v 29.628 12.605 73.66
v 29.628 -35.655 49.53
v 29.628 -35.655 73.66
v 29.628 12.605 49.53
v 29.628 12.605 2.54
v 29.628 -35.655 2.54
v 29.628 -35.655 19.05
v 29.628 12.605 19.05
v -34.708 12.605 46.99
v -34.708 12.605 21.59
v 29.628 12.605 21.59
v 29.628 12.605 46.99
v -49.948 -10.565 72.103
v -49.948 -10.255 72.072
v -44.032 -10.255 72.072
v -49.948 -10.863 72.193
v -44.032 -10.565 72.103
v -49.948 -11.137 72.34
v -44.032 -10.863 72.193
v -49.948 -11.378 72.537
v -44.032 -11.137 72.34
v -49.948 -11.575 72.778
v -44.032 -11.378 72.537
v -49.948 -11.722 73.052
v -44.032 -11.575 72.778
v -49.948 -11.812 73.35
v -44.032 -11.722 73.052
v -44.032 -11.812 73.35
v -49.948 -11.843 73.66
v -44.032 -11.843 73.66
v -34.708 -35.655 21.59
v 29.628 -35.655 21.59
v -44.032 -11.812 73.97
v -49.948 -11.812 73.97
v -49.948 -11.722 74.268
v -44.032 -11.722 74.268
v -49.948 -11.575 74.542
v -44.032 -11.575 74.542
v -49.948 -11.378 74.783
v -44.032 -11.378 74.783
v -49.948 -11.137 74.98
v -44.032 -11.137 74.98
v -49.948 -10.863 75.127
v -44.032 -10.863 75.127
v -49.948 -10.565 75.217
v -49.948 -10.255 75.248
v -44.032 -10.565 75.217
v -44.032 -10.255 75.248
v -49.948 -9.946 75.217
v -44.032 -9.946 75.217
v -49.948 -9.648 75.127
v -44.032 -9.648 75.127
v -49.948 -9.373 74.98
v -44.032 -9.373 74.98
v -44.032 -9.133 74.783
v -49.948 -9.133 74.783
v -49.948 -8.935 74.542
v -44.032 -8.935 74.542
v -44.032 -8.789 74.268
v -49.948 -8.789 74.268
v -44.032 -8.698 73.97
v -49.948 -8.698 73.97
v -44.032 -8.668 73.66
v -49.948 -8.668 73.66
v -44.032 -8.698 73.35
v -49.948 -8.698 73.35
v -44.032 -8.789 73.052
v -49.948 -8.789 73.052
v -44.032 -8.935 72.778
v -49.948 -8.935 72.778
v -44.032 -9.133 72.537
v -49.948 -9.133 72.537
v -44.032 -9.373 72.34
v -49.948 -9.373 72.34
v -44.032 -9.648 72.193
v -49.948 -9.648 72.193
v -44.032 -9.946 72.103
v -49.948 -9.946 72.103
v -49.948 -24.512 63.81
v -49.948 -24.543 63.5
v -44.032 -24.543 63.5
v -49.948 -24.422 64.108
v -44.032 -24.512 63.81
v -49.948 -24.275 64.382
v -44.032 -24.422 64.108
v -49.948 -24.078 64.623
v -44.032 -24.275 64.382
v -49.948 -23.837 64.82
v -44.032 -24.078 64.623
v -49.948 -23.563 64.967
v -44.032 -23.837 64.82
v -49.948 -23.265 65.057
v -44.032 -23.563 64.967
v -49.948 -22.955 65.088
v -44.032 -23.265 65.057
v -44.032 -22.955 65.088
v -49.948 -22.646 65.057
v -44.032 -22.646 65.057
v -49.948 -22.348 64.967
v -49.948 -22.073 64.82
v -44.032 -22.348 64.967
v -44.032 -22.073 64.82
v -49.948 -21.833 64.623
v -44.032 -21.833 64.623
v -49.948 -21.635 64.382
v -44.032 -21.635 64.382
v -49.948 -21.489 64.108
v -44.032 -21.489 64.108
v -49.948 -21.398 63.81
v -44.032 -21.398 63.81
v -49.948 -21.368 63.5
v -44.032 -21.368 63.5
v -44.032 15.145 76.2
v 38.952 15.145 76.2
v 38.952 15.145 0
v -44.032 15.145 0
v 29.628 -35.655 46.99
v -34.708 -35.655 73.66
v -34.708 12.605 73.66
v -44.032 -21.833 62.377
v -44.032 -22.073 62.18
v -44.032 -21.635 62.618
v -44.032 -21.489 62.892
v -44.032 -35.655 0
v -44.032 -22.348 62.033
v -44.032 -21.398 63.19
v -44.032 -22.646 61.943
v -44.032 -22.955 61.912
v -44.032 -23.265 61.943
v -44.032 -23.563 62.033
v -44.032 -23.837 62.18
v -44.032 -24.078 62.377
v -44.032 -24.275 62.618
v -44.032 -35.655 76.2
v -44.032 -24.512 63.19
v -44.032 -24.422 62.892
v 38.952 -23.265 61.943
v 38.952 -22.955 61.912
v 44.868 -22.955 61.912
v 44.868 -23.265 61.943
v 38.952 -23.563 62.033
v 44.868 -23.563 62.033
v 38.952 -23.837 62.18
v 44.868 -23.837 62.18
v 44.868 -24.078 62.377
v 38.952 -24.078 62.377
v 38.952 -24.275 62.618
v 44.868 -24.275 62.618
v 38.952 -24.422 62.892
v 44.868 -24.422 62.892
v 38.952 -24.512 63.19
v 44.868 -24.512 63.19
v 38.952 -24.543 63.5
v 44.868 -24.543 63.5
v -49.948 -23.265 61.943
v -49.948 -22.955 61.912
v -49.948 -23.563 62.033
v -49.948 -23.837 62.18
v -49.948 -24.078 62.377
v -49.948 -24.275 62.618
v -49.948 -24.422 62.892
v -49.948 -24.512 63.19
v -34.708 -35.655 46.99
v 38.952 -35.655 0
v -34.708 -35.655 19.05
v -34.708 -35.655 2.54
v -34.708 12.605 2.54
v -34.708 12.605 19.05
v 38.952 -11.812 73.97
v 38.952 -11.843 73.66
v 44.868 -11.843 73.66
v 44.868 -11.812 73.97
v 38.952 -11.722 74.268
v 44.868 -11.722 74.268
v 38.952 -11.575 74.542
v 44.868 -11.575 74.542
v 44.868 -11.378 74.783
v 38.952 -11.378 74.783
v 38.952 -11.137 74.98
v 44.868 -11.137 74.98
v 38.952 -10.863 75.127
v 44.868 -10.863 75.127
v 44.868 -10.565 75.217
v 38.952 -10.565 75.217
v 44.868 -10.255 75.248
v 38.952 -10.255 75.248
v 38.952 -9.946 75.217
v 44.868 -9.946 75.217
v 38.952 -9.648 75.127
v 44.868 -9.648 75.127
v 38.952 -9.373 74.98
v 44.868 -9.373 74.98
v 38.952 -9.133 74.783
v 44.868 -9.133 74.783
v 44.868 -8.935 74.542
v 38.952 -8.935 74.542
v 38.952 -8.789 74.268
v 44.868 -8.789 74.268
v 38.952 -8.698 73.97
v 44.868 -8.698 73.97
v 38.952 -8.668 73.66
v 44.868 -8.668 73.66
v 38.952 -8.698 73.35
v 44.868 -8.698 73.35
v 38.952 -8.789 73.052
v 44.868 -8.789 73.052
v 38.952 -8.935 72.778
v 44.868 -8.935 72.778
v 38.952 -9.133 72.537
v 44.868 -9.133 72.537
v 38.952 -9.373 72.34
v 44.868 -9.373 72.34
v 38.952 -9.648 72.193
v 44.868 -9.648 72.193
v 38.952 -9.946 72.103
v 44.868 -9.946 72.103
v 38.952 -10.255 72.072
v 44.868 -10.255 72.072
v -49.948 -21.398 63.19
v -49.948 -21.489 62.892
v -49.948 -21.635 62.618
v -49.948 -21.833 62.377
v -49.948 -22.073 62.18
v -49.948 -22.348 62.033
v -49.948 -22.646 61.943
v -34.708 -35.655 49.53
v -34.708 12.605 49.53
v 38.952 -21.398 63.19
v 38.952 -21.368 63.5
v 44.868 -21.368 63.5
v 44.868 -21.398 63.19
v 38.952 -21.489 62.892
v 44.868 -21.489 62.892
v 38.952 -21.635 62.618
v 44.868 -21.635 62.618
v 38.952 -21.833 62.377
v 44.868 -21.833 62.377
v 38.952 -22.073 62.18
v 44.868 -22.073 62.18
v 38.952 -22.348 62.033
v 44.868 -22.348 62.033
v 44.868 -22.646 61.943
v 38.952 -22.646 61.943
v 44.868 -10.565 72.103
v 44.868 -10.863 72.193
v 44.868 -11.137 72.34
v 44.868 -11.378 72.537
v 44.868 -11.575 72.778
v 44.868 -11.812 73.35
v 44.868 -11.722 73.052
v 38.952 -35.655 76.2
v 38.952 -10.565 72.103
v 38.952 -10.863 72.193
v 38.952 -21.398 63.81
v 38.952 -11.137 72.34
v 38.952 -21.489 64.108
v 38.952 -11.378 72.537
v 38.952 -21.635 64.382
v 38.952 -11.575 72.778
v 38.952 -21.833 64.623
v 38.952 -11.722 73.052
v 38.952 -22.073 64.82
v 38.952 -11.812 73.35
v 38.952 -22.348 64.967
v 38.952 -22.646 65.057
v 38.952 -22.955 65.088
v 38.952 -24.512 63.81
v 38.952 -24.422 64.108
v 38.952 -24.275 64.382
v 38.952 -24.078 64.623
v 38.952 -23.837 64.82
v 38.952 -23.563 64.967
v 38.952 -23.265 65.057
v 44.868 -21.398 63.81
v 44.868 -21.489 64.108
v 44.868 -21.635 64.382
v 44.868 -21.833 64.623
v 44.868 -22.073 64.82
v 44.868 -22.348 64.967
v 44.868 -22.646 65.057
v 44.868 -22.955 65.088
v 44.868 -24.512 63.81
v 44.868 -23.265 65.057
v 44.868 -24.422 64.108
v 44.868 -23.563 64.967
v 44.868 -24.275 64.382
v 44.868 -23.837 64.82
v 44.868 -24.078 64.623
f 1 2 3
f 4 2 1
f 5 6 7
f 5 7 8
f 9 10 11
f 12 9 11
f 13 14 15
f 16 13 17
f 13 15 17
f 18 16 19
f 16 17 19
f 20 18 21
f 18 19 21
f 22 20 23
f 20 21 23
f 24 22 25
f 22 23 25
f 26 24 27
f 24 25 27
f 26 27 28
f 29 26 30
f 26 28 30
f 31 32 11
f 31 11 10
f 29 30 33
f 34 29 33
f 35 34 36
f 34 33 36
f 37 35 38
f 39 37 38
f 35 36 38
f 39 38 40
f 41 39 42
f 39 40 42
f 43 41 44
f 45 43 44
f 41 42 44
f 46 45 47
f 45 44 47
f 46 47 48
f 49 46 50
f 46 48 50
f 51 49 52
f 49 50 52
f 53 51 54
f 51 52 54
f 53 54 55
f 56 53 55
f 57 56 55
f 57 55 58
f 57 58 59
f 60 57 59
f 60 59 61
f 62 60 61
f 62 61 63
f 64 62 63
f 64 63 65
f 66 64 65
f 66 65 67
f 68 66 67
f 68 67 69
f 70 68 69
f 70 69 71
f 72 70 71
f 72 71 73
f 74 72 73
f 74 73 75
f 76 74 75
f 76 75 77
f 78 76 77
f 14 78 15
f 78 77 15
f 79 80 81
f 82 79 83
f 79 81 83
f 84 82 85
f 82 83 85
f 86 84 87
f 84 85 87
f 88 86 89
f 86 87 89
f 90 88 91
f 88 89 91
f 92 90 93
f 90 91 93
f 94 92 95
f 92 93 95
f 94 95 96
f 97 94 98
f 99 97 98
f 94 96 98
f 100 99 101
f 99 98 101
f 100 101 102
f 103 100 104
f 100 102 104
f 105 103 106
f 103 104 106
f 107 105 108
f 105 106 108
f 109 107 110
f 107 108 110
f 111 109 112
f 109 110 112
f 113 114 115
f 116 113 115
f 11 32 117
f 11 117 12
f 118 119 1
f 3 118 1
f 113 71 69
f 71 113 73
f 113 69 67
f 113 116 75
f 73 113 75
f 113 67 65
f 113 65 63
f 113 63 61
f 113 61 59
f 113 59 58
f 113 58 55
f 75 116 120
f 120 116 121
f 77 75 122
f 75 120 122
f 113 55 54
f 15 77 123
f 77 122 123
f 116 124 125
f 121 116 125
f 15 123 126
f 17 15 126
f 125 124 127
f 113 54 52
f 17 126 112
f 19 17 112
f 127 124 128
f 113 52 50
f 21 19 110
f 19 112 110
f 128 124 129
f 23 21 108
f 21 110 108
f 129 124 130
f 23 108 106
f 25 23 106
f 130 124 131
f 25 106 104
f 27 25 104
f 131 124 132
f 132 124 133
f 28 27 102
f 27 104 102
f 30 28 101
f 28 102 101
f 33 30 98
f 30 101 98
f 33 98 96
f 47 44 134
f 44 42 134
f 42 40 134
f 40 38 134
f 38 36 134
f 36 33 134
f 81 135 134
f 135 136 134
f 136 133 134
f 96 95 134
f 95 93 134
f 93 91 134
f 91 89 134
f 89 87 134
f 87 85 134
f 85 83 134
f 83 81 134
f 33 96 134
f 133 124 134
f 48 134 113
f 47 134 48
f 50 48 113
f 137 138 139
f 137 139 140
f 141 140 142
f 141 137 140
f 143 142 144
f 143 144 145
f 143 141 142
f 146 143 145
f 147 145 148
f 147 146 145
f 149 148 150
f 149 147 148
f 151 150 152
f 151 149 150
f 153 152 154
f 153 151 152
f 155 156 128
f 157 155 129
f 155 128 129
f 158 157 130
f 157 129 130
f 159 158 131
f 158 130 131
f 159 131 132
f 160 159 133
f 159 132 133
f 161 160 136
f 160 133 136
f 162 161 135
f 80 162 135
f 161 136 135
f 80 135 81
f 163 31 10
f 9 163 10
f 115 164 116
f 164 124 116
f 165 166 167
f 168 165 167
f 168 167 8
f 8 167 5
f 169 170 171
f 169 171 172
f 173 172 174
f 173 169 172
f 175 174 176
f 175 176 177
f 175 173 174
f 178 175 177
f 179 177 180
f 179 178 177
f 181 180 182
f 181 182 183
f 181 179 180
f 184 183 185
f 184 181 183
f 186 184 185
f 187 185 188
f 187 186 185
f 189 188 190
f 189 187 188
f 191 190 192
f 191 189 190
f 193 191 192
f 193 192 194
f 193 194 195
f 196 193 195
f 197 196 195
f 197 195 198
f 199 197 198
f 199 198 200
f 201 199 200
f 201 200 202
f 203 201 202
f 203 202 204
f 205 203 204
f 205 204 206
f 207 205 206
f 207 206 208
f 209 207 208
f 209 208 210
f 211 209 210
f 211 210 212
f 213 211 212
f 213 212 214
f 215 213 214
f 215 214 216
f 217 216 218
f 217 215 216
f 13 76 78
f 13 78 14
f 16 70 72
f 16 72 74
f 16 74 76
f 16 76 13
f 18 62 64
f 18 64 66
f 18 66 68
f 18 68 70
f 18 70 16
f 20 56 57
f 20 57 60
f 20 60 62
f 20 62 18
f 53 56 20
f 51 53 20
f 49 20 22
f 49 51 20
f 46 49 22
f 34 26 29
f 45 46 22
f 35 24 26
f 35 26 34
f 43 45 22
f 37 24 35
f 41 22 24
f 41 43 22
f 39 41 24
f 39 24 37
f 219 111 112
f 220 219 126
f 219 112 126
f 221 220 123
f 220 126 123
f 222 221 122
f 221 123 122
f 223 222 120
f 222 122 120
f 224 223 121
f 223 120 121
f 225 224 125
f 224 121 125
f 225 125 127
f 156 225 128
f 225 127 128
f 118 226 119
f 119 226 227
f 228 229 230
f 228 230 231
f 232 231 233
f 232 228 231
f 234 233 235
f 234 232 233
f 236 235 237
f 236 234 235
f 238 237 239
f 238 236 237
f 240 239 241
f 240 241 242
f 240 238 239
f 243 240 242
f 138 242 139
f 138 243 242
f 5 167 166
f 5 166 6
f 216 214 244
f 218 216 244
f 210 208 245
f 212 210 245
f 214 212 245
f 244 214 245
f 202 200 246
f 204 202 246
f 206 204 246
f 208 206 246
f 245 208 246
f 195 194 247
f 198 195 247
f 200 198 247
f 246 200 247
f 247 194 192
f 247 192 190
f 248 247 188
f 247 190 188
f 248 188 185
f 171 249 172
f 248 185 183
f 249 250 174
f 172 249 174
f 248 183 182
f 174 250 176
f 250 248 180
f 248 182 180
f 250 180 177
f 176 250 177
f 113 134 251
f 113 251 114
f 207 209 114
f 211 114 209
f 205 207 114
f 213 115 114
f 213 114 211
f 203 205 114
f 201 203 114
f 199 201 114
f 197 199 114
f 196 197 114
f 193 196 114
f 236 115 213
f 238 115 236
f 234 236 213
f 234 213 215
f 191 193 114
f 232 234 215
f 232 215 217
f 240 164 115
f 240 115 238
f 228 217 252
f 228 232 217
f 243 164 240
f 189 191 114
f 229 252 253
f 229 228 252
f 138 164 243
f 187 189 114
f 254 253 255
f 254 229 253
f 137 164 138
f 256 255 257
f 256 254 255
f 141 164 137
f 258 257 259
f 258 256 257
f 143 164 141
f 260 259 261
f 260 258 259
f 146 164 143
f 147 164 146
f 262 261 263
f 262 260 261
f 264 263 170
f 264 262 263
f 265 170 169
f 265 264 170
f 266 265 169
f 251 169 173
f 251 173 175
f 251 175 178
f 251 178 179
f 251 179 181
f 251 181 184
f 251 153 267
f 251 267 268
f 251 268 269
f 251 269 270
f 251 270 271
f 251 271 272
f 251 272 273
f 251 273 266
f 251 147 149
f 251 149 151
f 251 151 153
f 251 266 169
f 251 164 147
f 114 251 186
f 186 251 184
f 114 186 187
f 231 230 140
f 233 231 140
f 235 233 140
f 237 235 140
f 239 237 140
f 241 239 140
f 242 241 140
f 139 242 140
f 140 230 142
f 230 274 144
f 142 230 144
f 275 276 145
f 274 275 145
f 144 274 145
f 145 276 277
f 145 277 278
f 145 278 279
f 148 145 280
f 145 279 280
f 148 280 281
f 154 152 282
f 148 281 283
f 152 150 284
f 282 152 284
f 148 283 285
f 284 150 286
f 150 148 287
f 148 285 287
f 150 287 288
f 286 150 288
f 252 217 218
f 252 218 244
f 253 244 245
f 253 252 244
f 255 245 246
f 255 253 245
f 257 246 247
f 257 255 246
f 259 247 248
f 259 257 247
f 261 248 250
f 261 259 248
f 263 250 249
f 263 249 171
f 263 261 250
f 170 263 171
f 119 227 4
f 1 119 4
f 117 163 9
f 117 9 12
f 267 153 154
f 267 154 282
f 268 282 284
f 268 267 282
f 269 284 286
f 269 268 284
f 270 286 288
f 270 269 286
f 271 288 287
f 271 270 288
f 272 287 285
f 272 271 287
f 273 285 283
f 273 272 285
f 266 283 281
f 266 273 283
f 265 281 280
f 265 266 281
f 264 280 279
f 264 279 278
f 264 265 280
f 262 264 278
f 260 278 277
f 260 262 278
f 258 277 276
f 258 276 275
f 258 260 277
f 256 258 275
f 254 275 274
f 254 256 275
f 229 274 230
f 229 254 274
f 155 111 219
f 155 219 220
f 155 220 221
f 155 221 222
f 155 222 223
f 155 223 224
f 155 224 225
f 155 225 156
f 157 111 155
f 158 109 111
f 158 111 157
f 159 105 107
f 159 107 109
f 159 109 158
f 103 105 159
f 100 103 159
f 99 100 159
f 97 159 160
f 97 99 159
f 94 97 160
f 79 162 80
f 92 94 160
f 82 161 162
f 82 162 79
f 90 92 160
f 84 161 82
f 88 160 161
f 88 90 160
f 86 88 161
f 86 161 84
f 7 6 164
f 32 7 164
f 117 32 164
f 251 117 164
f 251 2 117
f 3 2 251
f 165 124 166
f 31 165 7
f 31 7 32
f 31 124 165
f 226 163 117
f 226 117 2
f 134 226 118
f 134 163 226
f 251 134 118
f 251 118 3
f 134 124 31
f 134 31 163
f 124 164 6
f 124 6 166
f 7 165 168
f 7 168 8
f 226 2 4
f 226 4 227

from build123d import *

# Parameters (mm, degrees)
F0_W      = 71.12
F0_H      = 50.8
F1_DEPTH  = 76.2
F3_T      = -2.54
F4_DEPTH  = 50.8
F5_DEPTH  = 50.8
F7_DEPTH  = 12.7
F8_DEPTH  = 12.7
F9_DEPTH  = 12.7
F12_DEPTH = 5.08
F13_DEPTH = 5.08


with BuildPart() as f1:
    # F0 (on Top) → F1 (new body)
    with BuildSketch(Plane.XY):
        with Locations((-1.6881457889, -10.255297339)):
            Rectangle(F0_W, F0_H)
    extrude(amount=F1_DEPTH)

    # F3
    f3_openings = [f1.faces().sort_by_distance(p)[0] for p in [
        (-1.688146, -35.655297, 38.1),
    ]]
    offset(amount=F3_T, openings=f3_openings)

    # F2 (on face) → F4 (join)
    with BuildSketch(Plane.XZ.offset(35.655297339)):
        Polygon((-37.2481457889, 49.53), (-37.2481457889, 46.99), (-1.6881457889, 46.99), (33.8718542111, 46.99), (33.8718542111, 49.53), align=None)
    extrude(amount=-F4_DEPTH)

    # F2 (on face) → F5 (join)
    with BuildSketch(Plane.XZ.offset(35.655297339)):
        Polygon((-37.2481457889, 19.05), (-1.6881457889, 19.05), (33.8718542111, 19.05), (33.8718542111, 21.59), (-1.6881457889, 21.59), (-37.2481457889, 21.59), align=None)
    extrude(amount=-F5_DEPTH)

    # F6 (on face) → F7 (join)
    with BuildSketch(Plane(origin=(-37.2481457889, 0, 0), x_dir=(0, -1, 0), z_dir=(-1, 0, 0))):
        with BuildLine():
            ThreePointArc((11.842797339, 73.66), (9.1327653238, 74.7825320151), (10.255297339, 72.0725))
            ThreePointArc((10.255297339, 72.0725), (11.3778293541, 72.5374679849), (11.842797339, 73.66))
        make_face()
    extrude(amount=F7_DEPTH)

    # F6 (on face) → F8 (join)
    with BuildSketch(Plane(origin=(-37.2481457889, 0, 0), x_dir=(0, -1, 0), z_dir=(-1, 0, 0))):
        with BuildLine():
            Line((22.955297339, 63.5), (22.955297339, 61.9125))
            ThreePointArc((22.955297339, 61.9125), (24.0778293541, 62.3774679849), (24.542797339, 63.5))
            ThreePointArc((24.542797339, 63.5), (22.955297339, 65.0875), (21.367797339, 63.5))
            Line((21.367797339, 63.5), (22.955297339, 63.5))
        make_face()
    extrude(amount=F8_DEPTH)

    # F6 (on face) → F9 (join)
    with BuildSketch(Plane(origin=(-37.2481457889, 0, 0), x_dir=(0, -1, 0), z_dir=(-1, 0, 0))):
        with BuildLine():
            ThreePointArc((21.367797339, 63.5), (21.8327653238, 62.3774679849), (22.955297339, 61.9125))
            Line((22.955297339, 61.9125), (22.955297339, 63.5))
            Line((22.955297339, 63.5), (21.367797339, 63.5))
        make_face()
    extrude(amount=F9_DEPTH)

    # F11: F1 across plane


with BuildPart() as f1_1:
    add(f1.part)
    add(f1.part.mirror(Plane.YZ.offset(-2.54)))

    # F12 (add): a face of the model
    f12_faces = [f1_1.faces().sort_by_distance(p)[0] for p in [
        (-38.9518542111, -10.2292152391, 37.9748059207),
    ]]
    extrude(f12_faces, amount=F12_DEPTH)

    # F13 (add): a face of the model
    f13_faces = [f1_1.faces().sort_by_distance(p)[0] for p in [
        (33.8718542111, -10.2292152391, 37.9748059207),
    ]]
    extrude(f13_faces, amount=F13_DEPTH)


solid = f1_1.part
